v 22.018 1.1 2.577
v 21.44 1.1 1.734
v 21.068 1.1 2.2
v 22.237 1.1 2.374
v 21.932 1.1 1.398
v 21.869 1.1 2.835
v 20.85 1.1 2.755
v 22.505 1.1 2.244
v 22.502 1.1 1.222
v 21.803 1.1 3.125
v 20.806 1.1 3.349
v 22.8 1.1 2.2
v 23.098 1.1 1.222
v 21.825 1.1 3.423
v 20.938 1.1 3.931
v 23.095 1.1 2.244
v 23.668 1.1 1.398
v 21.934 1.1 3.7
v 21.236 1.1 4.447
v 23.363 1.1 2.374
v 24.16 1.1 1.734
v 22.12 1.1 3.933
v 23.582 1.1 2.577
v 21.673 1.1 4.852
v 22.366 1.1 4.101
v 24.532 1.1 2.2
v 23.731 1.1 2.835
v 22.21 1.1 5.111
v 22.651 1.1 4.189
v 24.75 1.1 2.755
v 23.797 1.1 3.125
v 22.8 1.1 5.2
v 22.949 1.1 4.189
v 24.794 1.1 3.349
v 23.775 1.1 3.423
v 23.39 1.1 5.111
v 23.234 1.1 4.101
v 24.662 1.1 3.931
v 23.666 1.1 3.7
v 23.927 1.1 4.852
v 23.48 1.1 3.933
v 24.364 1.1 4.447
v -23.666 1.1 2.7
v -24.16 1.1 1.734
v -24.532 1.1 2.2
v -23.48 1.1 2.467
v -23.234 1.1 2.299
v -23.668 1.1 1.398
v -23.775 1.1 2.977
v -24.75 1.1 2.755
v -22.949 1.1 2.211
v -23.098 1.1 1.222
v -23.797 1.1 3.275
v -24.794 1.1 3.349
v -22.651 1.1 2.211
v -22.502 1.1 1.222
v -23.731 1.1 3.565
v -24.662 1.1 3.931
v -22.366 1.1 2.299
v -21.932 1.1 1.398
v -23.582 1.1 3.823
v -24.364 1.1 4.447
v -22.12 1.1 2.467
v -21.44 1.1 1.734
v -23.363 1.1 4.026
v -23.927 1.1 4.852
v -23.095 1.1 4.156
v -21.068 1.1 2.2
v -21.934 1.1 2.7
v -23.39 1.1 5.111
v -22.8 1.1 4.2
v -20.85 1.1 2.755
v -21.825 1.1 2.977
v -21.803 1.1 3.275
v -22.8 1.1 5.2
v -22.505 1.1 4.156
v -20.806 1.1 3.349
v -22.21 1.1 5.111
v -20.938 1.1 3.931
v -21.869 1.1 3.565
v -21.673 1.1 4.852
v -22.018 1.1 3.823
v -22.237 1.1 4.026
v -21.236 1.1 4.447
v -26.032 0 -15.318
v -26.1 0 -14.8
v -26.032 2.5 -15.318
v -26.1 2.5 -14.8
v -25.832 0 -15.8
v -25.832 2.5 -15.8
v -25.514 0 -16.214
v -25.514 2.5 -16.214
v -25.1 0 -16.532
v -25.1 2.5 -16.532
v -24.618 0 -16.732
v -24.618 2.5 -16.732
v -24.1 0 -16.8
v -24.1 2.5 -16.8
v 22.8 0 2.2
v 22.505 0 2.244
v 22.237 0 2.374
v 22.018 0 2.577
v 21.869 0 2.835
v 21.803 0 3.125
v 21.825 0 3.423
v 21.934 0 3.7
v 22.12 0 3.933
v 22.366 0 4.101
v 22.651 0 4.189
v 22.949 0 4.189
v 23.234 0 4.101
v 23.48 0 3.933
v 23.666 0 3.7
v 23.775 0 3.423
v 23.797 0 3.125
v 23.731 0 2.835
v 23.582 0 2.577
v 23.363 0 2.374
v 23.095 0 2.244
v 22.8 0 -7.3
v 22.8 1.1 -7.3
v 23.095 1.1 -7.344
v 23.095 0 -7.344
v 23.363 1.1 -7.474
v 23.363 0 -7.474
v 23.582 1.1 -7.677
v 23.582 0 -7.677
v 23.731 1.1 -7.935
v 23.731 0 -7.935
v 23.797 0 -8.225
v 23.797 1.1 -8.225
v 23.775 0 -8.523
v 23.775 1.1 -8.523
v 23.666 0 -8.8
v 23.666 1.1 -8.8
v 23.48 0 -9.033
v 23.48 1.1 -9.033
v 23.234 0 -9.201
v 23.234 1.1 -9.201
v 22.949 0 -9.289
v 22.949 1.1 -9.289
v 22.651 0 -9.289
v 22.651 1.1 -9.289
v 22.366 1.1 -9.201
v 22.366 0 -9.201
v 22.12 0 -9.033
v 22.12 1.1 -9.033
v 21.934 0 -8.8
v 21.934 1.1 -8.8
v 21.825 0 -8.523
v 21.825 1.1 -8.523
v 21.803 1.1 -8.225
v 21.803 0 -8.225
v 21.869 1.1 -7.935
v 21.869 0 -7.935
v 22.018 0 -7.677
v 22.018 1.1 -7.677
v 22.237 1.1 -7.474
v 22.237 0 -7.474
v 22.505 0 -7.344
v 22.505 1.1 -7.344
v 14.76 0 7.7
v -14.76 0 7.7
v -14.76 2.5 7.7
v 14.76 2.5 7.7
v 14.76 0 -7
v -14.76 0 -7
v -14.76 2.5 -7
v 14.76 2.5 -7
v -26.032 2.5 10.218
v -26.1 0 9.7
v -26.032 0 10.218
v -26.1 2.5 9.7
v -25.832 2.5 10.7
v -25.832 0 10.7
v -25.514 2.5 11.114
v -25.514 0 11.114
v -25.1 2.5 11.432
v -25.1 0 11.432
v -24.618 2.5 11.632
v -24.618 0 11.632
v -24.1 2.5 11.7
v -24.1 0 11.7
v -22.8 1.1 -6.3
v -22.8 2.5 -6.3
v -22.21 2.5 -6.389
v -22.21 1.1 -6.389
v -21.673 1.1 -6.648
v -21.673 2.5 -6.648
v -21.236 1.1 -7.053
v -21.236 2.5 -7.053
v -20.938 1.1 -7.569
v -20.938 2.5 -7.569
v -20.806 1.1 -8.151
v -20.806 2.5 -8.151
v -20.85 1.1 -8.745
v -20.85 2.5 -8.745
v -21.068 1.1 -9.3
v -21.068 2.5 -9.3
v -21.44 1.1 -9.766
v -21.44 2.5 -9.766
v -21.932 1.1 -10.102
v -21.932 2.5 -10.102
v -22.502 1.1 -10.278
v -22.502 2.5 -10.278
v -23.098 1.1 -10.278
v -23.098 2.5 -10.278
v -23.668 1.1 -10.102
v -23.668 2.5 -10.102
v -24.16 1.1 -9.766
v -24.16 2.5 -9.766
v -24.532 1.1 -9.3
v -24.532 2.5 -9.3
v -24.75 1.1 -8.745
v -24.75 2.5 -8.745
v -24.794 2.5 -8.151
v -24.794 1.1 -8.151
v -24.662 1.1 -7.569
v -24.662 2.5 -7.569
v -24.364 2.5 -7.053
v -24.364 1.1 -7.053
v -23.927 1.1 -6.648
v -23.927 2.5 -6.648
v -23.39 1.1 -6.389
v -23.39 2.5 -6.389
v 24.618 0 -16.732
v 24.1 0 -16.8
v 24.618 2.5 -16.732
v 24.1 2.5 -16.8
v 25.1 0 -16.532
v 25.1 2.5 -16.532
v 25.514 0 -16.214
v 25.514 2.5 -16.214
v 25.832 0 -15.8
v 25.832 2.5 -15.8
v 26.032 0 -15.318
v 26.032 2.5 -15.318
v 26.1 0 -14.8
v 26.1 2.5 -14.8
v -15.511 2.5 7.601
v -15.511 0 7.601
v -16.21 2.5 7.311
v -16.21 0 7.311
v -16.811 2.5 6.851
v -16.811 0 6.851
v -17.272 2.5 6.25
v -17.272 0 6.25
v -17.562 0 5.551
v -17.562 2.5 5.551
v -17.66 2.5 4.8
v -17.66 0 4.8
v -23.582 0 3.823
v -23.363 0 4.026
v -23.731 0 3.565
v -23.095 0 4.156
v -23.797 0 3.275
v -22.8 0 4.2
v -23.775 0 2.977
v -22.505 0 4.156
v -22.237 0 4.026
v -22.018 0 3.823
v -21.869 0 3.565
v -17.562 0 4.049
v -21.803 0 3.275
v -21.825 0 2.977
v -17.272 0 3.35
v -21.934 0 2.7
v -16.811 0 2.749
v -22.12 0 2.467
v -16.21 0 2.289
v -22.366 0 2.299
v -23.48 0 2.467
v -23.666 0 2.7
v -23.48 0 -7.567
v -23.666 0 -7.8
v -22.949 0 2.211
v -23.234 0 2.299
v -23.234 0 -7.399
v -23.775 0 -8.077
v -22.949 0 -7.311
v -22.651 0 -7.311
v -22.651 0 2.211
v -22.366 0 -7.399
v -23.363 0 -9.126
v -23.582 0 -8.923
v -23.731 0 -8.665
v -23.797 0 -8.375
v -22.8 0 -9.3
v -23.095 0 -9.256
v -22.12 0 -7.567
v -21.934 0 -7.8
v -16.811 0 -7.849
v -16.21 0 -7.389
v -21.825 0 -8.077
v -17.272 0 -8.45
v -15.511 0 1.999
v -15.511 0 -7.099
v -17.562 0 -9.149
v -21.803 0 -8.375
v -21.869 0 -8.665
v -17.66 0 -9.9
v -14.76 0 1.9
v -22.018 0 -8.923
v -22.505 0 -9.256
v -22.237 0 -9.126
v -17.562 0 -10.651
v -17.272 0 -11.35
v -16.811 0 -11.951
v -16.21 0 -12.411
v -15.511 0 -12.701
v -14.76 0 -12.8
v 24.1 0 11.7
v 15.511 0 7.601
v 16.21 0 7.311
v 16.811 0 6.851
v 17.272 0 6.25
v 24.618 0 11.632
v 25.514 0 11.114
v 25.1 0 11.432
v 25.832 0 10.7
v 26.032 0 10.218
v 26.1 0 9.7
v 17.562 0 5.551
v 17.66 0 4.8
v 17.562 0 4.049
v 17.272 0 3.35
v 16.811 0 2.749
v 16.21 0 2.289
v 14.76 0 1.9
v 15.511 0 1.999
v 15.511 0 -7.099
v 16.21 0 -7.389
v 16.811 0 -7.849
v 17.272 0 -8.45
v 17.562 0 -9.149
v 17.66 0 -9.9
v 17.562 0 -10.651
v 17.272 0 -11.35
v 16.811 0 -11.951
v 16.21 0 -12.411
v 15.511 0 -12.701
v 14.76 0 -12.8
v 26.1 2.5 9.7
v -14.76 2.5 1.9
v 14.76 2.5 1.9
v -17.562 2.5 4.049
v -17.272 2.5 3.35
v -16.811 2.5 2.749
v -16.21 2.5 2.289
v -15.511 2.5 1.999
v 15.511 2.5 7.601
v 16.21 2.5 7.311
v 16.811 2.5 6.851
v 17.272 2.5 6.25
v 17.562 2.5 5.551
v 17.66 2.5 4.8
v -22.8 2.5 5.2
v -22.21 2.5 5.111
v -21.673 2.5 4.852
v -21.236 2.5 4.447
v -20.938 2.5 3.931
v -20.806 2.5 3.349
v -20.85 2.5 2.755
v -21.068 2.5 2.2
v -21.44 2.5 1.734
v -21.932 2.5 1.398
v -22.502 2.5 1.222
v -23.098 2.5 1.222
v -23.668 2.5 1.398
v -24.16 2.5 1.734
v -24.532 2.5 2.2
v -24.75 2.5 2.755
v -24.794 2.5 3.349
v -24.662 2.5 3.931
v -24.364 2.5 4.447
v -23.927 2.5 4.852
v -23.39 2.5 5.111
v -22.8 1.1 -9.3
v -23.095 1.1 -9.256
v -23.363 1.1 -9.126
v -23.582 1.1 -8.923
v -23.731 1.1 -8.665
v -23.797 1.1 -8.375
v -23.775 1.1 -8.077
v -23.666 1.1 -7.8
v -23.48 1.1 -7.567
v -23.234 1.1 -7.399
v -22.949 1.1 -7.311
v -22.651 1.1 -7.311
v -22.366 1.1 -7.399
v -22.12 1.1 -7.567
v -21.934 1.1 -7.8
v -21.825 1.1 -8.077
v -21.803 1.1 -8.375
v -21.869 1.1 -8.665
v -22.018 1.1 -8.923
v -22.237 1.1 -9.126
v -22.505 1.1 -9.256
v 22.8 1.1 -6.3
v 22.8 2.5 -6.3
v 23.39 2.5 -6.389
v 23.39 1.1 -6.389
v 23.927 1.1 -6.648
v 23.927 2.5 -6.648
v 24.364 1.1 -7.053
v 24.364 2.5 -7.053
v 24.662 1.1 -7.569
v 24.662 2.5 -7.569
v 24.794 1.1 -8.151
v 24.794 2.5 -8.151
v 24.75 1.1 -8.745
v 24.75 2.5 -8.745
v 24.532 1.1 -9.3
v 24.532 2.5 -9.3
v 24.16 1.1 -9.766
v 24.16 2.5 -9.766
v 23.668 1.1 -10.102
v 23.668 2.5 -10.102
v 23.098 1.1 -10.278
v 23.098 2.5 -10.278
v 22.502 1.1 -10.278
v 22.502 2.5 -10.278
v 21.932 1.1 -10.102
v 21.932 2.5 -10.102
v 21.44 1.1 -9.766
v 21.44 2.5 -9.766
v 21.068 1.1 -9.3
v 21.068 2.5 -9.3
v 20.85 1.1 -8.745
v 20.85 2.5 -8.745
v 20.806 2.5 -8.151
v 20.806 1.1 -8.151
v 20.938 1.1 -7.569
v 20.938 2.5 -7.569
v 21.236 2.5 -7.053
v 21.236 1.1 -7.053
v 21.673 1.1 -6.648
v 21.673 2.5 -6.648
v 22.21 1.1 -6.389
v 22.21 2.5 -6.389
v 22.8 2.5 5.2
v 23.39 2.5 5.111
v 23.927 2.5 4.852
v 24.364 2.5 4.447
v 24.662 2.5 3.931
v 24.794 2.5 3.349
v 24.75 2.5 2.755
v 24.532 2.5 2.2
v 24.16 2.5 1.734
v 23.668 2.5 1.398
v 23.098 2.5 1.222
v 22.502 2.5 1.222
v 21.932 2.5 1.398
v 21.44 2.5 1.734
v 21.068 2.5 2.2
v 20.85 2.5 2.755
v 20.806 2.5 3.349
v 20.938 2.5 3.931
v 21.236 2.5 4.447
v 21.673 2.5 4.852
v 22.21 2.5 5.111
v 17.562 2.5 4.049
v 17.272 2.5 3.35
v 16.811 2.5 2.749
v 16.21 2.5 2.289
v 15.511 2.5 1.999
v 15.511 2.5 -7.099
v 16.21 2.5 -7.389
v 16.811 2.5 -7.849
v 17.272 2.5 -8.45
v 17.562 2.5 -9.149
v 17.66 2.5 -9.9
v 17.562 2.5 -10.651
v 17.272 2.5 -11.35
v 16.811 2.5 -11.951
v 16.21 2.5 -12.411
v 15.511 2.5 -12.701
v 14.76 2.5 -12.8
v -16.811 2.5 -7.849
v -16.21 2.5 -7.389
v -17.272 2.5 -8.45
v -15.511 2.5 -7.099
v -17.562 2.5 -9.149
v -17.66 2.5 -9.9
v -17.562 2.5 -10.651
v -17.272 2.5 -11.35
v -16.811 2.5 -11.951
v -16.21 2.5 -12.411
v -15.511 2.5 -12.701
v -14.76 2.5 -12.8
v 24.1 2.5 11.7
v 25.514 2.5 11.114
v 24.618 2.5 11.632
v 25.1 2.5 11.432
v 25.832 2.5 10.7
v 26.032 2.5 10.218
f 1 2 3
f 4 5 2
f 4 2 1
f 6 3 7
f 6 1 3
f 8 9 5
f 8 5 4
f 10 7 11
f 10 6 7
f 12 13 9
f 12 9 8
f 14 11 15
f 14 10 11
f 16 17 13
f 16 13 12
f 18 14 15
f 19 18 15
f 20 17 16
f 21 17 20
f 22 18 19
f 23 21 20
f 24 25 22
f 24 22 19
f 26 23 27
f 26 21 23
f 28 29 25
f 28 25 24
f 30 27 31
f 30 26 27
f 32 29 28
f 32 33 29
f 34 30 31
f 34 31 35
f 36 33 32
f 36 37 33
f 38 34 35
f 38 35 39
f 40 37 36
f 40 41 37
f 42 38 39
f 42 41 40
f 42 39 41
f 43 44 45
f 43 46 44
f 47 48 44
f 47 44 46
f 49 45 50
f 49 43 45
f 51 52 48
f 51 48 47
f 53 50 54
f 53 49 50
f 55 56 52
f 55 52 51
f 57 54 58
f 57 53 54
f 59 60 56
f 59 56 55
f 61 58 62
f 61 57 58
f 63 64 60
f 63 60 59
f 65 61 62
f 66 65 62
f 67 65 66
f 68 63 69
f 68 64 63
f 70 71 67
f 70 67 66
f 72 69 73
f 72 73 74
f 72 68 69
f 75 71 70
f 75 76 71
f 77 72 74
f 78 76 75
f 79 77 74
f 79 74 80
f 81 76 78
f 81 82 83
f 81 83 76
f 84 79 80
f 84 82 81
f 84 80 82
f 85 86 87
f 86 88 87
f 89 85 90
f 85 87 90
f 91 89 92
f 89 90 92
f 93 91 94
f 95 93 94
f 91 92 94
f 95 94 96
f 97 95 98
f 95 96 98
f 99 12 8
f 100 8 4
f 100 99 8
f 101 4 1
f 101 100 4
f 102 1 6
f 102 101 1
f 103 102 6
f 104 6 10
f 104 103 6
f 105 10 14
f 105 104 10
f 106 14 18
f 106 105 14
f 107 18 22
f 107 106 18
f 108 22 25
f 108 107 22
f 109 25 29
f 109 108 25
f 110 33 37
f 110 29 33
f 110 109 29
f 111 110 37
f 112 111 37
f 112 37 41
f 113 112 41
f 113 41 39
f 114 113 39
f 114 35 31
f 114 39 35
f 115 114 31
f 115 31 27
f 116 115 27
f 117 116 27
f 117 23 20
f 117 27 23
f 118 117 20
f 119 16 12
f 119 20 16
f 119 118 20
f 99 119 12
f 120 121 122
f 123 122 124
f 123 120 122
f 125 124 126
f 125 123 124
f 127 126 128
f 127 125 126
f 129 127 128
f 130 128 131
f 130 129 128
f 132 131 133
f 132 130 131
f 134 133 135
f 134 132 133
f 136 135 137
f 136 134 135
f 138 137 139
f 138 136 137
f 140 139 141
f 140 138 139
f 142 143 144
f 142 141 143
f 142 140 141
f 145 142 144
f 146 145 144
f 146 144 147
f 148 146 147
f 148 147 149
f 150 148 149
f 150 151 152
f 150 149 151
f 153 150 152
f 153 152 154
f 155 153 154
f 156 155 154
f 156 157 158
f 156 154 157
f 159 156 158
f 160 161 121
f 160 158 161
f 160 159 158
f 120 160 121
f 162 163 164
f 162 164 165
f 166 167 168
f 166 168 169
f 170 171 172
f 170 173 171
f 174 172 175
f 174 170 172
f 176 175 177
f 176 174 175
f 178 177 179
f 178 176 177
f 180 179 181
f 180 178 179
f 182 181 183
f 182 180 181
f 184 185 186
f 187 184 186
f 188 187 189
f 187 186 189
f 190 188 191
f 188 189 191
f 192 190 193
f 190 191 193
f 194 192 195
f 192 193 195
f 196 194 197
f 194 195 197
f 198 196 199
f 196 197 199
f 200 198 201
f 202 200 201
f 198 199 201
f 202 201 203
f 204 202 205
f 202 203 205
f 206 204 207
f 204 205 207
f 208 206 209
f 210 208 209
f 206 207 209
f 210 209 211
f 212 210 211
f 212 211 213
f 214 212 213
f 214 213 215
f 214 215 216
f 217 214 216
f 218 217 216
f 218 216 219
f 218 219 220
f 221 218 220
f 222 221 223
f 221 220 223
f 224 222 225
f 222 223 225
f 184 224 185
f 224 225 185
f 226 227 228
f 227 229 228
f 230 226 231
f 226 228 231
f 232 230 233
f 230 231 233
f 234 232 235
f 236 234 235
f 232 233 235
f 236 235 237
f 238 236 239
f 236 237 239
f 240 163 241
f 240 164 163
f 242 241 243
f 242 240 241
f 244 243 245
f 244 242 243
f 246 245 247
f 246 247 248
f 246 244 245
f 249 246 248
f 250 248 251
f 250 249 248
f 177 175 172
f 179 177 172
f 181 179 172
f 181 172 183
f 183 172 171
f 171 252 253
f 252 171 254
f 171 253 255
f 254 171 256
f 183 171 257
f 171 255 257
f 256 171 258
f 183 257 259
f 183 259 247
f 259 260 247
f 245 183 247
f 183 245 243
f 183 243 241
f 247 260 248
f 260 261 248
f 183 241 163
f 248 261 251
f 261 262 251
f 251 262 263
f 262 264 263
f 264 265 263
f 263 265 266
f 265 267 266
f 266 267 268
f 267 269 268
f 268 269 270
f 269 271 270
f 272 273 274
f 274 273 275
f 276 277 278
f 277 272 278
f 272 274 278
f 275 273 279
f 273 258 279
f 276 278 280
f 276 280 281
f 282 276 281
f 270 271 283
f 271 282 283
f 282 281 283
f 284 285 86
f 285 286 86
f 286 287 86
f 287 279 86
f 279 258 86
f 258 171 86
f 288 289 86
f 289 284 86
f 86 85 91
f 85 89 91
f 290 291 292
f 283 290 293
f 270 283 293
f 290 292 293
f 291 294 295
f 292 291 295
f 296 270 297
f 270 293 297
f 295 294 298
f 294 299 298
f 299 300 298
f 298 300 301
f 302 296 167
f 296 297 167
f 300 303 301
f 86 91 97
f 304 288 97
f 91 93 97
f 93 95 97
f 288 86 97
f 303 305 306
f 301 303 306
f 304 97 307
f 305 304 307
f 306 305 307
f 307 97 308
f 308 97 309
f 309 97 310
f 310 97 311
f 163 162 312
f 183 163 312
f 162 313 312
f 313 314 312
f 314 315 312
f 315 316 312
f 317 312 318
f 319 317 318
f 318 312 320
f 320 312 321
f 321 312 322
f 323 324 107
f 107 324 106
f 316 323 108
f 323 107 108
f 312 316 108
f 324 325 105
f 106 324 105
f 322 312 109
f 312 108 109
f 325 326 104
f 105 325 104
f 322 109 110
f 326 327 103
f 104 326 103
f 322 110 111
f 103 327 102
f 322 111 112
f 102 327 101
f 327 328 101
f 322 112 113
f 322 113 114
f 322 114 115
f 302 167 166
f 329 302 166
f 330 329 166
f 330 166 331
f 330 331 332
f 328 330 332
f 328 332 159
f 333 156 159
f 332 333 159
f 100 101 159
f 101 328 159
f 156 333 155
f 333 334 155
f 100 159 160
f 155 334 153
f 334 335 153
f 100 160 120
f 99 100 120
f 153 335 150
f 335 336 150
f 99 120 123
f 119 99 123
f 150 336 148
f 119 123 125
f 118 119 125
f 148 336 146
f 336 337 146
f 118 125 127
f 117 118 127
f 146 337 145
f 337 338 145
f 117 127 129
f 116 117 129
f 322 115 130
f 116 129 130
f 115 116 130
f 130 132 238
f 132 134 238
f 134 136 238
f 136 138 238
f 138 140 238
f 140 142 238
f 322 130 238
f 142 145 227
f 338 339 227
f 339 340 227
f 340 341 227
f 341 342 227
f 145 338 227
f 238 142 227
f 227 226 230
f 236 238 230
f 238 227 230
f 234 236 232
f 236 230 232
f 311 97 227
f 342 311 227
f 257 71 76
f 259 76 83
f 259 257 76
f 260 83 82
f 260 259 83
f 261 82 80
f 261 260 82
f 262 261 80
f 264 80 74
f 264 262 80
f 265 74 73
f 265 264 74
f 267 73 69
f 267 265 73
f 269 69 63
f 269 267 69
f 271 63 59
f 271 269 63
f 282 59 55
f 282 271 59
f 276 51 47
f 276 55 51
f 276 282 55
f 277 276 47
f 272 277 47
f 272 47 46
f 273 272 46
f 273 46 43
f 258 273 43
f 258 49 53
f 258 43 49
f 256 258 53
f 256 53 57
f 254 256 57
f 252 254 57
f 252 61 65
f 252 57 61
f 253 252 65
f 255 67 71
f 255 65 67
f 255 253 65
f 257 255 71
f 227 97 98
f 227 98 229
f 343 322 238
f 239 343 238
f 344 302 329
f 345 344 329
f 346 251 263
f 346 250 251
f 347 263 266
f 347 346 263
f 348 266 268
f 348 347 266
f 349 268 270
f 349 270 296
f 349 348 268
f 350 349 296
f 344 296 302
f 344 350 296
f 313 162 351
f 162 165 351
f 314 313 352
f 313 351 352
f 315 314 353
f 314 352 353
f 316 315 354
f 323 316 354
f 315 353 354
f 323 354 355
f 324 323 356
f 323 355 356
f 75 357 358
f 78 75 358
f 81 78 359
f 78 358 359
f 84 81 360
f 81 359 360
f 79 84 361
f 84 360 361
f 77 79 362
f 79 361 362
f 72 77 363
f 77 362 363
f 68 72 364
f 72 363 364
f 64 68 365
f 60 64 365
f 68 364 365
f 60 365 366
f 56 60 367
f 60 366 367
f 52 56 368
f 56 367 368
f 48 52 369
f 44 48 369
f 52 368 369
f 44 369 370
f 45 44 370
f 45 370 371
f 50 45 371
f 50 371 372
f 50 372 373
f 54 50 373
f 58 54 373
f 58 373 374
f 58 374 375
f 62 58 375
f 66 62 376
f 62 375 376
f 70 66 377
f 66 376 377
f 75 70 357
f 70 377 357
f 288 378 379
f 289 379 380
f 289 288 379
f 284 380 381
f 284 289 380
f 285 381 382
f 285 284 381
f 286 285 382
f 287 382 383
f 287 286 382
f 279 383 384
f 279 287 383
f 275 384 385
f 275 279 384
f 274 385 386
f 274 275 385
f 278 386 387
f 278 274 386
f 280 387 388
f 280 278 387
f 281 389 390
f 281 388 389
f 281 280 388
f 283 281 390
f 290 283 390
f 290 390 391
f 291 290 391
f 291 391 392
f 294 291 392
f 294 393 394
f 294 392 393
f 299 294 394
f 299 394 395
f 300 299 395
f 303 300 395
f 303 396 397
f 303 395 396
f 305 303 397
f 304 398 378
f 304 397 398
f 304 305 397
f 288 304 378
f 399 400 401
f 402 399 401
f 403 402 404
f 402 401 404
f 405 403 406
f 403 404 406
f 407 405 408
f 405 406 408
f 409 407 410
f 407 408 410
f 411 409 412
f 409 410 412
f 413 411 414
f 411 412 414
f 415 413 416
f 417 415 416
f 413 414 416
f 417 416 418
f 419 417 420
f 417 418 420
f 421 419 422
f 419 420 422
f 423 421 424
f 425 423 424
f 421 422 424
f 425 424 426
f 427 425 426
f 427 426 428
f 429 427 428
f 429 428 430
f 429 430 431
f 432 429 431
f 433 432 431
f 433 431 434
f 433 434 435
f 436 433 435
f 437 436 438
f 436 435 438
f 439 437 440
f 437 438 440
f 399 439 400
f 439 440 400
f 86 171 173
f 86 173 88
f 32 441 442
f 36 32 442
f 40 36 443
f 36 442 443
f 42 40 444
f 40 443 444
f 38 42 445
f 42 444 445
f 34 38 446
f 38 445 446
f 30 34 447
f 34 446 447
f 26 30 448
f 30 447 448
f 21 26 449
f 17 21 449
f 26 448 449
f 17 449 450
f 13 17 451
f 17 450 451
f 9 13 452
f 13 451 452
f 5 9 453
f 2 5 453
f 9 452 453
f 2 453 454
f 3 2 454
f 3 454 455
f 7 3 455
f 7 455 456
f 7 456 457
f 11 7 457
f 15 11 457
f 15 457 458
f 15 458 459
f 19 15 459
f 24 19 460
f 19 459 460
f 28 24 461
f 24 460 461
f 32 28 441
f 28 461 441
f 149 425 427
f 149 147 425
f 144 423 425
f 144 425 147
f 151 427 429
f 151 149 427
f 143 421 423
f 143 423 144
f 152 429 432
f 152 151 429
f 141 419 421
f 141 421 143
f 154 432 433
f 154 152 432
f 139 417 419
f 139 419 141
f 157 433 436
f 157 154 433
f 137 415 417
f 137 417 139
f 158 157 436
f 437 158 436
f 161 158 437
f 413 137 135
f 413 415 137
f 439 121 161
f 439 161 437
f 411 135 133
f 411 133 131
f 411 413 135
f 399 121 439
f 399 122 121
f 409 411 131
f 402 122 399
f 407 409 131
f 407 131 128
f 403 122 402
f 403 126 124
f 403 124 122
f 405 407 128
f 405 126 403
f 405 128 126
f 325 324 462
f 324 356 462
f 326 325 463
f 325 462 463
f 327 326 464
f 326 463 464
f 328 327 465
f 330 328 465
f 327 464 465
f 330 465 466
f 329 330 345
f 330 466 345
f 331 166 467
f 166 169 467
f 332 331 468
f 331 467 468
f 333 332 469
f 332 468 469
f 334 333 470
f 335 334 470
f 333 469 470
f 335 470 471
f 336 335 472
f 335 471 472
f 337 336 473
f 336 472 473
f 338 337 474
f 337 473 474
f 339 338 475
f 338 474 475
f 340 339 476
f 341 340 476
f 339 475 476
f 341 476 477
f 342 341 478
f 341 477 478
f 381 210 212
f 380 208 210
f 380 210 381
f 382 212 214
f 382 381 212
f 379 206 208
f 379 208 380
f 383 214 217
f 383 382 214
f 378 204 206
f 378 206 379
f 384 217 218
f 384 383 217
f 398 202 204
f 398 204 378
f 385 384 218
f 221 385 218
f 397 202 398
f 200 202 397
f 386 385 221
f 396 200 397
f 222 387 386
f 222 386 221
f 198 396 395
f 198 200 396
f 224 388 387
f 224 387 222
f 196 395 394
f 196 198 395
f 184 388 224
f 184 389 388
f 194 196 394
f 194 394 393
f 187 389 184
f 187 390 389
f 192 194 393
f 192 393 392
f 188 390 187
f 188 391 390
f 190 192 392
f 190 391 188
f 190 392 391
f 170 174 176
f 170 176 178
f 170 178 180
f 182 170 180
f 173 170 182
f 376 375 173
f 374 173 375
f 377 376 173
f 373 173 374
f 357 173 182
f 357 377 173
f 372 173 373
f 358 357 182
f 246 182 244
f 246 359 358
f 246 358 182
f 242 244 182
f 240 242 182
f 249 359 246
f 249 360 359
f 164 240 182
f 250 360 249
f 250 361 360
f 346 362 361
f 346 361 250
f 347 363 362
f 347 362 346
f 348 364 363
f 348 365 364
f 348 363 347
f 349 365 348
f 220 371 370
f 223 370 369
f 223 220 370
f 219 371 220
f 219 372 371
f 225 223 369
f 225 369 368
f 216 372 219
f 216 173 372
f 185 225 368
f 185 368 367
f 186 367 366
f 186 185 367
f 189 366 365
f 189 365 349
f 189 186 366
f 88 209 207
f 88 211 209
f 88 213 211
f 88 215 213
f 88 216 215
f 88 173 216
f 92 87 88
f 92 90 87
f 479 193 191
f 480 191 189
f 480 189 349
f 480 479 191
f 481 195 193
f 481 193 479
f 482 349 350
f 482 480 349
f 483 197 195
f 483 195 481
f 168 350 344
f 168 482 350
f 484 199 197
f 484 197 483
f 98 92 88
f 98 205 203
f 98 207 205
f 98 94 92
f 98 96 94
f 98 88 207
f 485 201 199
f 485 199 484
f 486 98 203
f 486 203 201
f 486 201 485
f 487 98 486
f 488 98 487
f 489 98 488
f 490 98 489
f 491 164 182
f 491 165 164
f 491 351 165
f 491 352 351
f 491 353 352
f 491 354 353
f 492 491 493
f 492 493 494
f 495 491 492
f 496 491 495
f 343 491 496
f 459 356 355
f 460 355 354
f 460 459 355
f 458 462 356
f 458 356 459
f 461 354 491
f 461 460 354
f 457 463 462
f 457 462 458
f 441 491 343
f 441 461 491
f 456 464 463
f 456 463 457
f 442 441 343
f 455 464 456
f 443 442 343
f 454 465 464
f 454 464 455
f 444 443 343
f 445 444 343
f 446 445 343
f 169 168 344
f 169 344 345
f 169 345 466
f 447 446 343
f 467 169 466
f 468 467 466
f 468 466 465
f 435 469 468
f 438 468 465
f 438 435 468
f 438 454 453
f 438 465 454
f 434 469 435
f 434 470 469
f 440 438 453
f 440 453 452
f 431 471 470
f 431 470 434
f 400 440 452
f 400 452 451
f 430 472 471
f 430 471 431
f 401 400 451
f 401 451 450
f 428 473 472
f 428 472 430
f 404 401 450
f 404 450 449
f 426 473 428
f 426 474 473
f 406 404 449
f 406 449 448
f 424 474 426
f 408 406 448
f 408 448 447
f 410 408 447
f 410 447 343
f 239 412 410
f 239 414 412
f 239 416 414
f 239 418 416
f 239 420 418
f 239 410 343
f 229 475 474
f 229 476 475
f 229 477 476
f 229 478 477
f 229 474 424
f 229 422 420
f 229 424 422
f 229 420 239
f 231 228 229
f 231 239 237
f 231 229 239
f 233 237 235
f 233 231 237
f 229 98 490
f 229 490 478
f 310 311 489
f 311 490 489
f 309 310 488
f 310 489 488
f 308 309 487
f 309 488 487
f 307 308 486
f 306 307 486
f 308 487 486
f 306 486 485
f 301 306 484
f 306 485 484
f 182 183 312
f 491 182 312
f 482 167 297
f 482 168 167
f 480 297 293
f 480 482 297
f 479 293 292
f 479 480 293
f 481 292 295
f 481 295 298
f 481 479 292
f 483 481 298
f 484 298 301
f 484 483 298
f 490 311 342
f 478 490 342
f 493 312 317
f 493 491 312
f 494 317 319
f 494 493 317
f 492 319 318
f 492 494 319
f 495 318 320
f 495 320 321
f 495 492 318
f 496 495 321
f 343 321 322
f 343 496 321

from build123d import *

# Parameters (mm, degrees)
SKETCH1_W           = 52.2
SKETCH1_H           = 28.5
SKETCH1_R           = 1
SKETCH1_W_2         = 35.320636832
SKETCH1_H_2         = 5.8
BOSS_EXTRUDE1_DEPTH = 2.5
FILLET1_R           = 2
FILLET2_R           = 2.9
SKETCH4_R           = 2
CUT_EXTRUDE1_DEPTH  = 1.4


with BuildPart() as part:
    # Sketch1 → Boss-Extrude1 (new body)
    with BuildSketch(Plane(origin=(0, 0, 0), x_dir=(1, 0, 0), z_dir=(0, 1, 0))):
        with Locations((0, 2.55)):
            Rectangle(SKETCH1_W, SKETCH1_H)
        with Locations(Location((-22.8, -3.2, 0), (0, 0, 270))):
            Circle(SKETCH1_R, mode=Mode.SUBTRACT)
        with Locations(Location((22.8, -3.2, 0), (0, 0, 90))):
            Circle(SKETCH1_R, mode=Mode.SUBTRACT)
        with Locations(Location((22.8, 8.3, 0), (0, 0, 270))):
            Circle(SKETCH1_R, mode=Mode.SUBTRACT)
        with Locations(Location((-22.8, 8.3, 0), (0, 0, 90))):
            Circle(SKETCH1_R, mode=Mode.SUBTRACT)
        with Locations((0, -4.8)):
            Rectangle(SKETCH1_W_2, SKETCH1_H_2, mode=Mode.SUBTRACT)
        with Locations((0, 9.9)):
            Rectangle(SKETCH1_W_2, SKETCH1_H_2, mode=Mode.SUBTRACT)
    extrude(amount=BOSS_EXTRUDE1_DEPTH)

    # Fillet1
    fillet1_edges = [part.edges().sort_by_distance(p)[0] for p in [
        (26.1, 1.25, 11.7),
        (-26.1, 1.25, 11.7),
        (-26.1, 1.25, -16.8),
        (26.1, 1.25, -16.8),
    ]]
    fillet(fillet1_edges, radius=FILLET1_R)

    # Fillet2
    fillet2_edges = [part.edges().sort_by_distance(p)[0] for p in [
        (17.660318416, 1.25, -7),
        (17.660318416, 1.25, -12.8),
        (17.660318416, 1.25, 7.7),
        (17.660318416, 1.25, 1.9),
        (-17.660318416, 1.25, 7.7),
        (-17.660318416, 1.25, 1.9),
        (-17.660318416, 1.25, -7),
        (-17.660318416, 1.25, -12.8),
    ]]
    fillet(fillet2_edges, radius=FILLET2_R - 0.0001)  # a hair under: the kernel refuses the full size

    # Sketch4 → Cut-Extrude1 (cut)
    with BuildSketch(Plane(origin=(0, 2.5, 0), x_dir=(1, 0, 0), z_dir=(0, 1, 0))):
        with Locations(Location((-22.8, 8.3, 0), (0, 0, 270))):
            Circle(SKETCH4_R)
        with Locations(Location((-22.8, -3.2, 0), (0, 0, 270))):
            Circle(SKETCH4_R)
        with Locations(Location((22.8, -3.2, 0), (0, 0, 270))):
            Circle(SKETCH4_R)
        with Locations(Location((22.8, 8.3, 0), (0, 0, 270))):
            Circle(SKETCH4_R)
    extrude(amount=-CUT_EXTRUDE1_DEPTH, mode=Mode.SUBTRACT)


solid = part.part
